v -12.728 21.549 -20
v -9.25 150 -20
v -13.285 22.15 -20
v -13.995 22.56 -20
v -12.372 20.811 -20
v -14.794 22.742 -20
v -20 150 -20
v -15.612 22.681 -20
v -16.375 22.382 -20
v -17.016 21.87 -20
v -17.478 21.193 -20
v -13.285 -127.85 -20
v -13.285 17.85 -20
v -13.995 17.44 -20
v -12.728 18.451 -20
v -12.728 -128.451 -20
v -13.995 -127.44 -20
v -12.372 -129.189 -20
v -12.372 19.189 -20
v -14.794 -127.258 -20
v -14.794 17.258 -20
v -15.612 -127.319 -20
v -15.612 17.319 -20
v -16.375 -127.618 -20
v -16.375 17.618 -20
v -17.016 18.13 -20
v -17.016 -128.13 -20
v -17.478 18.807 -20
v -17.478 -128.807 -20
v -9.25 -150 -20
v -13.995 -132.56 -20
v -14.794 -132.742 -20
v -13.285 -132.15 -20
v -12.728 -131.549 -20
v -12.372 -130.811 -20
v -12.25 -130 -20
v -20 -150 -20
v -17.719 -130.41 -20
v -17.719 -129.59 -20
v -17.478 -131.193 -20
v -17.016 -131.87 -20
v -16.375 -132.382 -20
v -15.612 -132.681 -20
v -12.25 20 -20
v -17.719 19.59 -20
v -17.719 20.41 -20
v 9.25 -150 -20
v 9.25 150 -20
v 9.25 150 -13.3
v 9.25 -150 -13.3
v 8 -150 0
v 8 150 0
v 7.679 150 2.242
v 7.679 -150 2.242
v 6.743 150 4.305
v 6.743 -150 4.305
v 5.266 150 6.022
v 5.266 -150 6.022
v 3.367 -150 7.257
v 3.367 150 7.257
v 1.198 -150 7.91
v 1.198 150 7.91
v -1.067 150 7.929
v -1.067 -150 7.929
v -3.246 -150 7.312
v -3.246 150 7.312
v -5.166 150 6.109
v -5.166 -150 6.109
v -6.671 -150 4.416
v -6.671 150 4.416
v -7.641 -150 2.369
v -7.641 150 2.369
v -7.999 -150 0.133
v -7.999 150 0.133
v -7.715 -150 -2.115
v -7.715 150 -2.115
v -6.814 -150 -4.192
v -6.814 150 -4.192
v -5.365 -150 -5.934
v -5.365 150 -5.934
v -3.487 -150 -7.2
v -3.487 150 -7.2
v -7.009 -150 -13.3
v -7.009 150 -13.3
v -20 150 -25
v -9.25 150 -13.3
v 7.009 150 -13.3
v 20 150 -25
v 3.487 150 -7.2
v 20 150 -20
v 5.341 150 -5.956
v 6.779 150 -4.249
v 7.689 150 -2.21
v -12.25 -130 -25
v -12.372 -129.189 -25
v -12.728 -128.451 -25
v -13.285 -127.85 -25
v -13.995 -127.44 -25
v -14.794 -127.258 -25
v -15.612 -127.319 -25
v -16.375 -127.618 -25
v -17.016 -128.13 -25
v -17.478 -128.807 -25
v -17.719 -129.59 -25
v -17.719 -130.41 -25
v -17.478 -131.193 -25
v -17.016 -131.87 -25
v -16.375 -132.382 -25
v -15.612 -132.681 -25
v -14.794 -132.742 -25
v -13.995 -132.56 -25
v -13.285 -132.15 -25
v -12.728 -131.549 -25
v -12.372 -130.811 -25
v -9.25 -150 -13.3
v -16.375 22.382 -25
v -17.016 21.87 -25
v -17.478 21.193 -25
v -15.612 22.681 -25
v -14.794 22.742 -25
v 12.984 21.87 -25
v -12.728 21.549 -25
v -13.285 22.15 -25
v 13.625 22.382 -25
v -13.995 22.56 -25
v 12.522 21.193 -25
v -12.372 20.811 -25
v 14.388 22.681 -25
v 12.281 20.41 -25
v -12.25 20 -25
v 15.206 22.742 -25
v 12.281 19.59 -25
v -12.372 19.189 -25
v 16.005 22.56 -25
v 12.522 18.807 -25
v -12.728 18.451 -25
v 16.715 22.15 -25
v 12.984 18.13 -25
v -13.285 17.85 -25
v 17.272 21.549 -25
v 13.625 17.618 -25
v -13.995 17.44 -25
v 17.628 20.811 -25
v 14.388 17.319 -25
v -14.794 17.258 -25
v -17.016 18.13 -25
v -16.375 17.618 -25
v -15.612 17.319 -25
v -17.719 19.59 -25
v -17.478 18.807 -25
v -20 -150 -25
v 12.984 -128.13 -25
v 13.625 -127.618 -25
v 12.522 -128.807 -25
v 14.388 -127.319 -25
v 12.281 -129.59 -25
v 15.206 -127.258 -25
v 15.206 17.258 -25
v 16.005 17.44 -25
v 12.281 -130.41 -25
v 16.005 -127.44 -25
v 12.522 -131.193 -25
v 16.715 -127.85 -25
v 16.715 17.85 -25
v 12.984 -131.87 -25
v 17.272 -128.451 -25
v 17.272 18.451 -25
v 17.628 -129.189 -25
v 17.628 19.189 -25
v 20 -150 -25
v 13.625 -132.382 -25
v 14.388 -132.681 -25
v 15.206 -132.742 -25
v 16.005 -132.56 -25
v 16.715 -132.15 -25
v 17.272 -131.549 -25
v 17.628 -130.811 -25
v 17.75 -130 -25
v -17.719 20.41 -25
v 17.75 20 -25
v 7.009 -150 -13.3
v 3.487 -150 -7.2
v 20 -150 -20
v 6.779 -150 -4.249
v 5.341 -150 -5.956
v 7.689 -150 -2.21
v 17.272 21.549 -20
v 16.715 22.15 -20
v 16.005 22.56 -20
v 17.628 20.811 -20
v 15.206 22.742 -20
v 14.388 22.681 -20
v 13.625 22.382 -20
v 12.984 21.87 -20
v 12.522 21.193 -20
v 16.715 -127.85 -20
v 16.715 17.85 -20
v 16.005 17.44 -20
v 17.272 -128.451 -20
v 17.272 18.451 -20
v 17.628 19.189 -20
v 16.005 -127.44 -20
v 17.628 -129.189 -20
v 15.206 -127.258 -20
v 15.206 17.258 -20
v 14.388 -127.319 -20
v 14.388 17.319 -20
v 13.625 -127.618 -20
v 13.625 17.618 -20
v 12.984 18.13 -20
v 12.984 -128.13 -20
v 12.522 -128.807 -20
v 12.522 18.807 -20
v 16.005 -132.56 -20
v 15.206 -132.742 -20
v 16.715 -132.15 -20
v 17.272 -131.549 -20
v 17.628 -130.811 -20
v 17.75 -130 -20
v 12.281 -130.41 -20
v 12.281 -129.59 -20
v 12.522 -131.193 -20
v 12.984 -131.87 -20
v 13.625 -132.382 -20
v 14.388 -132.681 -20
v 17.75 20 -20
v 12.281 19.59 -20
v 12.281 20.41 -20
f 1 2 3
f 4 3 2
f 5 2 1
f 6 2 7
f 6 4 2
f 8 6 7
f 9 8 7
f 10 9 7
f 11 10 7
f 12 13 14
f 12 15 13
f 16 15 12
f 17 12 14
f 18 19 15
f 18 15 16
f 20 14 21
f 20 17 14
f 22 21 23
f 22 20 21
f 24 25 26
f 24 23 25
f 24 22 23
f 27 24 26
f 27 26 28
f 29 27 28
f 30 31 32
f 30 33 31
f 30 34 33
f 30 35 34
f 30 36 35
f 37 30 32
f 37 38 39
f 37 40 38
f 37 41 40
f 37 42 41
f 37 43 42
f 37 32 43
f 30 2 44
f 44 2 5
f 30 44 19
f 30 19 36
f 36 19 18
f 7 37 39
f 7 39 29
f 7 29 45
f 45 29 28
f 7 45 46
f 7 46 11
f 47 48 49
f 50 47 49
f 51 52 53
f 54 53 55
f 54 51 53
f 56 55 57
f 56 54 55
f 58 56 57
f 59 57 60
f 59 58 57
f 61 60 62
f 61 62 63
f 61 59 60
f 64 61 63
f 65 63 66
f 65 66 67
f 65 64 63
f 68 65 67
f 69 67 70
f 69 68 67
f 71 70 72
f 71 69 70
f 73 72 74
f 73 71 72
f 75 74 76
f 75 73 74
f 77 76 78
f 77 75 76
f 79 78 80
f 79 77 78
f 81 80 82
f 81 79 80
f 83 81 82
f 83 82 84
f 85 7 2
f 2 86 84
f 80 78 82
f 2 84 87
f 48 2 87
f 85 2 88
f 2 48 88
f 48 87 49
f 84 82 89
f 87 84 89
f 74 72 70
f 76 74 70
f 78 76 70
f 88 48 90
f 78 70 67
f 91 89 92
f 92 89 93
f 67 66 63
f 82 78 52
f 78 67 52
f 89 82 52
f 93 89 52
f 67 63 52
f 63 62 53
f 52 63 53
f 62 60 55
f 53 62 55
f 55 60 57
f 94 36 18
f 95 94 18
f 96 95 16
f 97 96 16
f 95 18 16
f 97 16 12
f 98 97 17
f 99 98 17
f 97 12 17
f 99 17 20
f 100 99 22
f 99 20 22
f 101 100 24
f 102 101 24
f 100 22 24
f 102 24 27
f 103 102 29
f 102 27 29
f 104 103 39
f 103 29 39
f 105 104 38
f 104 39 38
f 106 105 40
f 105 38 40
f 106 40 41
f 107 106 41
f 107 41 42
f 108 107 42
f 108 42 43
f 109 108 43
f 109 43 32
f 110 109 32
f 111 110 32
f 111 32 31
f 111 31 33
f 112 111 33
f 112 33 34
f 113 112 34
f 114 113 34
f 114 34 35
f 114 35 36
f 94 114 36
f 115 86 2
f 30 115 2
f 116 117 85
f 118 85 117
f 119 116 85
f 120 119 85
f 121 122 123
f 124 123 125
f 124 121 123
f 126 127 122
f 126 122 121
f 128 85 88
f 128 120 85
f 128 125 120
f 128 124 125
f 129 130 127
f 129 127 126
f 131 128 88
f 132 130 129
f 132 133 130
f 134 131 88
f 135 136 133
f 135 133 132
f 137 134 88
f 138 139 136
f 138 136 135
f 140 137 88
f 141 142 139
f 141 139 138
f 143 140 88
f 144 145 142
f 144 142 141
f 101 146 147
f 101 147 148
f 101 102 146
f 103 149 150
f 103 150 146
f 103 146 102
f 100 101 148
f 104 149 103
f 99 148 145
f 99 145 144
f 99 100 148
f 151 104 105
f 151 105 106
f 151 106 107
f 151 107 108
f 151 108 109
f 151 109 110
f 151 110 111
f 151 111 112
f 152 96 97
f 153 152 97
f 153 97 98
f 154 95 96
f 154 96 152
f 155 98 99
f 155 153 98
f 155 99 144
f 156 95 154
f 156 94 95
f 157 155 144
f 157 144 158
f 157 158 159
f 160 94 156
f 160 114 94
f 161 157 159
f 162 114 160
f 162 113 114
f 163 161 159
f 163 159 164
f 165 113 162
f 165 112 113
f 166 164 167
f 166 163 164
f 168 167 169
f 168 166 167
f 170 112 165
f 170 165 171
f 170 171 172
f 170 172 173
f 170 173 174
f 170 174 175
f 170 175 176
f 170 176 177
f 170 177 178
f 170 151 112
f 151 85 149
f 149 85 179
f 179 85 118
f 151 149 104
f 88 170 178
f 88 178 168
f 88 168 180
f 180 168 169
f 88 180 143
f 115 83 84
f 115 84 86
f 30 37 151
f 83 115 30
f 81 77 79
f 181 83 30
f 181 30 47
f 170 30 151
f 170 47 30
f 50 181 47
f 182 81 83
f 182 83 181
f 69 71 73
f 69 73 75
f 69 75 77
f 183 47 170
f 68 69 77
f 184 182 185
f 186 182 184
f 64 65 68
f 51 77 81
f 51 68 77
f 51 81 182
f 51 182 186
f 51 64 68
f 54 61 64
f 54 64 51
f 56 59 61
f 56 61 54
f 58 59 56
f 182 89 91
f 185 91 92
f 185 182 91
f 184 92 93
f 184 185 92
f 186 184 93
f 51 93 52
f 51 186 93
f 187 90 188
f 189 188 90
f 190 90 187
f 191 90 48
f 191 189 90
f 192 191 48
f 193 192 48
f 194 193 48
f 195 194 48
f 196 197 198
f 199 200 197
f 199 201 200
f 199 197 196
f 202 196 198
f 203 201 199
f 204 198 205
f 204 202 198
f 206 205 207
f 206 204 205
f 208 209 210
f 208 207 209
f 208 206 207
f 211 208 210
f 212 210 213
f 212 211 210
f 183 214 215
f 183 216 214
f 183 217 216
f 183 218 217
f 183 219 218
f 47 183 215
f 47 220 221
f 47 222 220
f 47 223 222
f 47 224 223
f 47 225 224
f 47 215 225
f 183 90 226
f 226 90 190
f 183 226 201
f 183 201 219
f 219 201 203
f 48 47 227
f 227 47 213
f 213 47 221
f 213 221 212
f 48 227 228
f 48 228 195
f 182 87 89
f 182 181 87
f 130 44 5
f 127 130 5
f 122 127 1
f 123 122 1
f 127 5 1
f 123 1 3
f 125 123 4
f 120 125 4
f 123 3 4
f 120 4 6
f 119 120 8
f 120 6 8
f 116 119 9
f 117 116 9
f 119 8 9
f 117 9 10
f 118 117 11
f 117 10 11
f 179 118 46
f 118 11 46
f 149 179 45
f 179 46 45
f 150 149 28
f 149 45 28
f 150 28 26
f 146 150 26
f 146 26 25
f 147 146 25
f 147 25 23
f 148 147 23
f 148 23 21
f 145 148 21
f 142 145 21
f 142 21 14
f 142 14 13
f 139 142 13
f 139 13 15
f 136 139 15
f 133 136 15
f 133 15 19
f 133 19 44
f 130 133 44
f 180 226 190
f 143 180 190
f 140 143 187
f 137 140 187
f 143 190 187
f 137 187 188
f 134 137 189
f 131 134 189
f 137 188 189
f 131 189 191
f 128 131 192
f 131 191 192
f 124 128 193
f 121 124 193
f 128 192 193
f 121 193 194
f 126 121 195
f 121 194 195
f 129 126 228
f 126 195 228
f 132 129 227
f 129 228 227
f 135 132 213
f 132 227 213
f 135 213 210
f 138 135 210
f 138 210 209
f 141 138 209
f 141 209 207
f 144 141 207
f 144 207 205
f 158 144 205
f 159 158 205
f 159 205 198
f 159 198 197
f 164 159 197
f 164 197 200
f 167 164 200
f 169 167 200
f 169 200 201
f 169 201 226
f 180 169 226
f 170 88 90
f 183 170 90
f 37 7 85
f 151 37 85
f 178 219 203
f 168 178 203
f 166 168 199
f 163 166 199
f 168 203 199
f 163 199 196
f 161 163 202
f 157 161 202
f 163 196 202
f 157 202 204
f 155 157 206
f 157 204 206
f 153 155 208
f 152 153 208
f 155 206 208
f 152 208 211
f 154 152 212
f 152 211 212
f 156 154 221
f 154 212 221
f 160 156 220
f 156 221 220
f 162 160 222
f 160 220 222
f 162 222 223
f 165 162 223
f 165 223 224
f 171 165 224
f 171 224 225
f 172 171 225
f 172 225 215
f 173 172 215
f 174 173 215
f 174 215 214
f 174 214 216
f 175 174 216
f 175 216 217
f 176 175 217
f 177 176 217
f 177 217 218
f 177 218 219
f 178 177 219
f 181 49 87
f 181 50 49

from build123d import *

# Parameters (mm, degrees)
F1_DEPTH = 150
F2_R     = 2.75
F3_DEPTH = 5.001


with BuildPart() as f1:
    # F0 (on Front) → F1 (new body, symmetric)
    with BuildSketch(Plane.XZ):
        with BuildLine():
            ThreePointArc((3.487119, -7.2), (6.778531, -4.248708), (8, 0))
            ThreePointArc((8, 0), (-4.248708, 6.778531), (-3.487119, -7.2))
            ThreePointArc((-3.487119, -7.2), (0, -8), (3.487119, -7.2))
        make_face()
        with BuildLine():
            ThreePointArc((3.487119, -7.2), (0, -8), (-3.487119, -7.2))
            Line((-3.487119, -7.2), (-7.008956, -13.3))
            Line((-7.008956, -13.3), (-9.25, -13.3))
            Line((-9.25, -13.3), (-9.25, -20))
            Line((-9.25, -20), (-20, -20))
            Line((-20, -20), (-20, -25))
            Line((-20, -25), (20, -25))
            Line((20, -25), (20, -20))
            Line((20, -20), (9.25, -20))
            Line((9.25, -20), (9.25, -13.3))
            Line((9.25, -13.3), (7.008956, -13.3))
            Line((7.008956, -13.3), (3.487119, -7.2))
        make_face()
    extrude(amount=F1_DEPTH, both=True)

    # F2 (on face) → F3 (cut, through all)
    with BuildSketch(Plane.XY.offset(-20)):
        with Locations((-15, -130)):
            Circle(F2_R)
        with Locations((15, -130)):
            Circle(F2_R)
        with Locations((-15, 20)):
            Circle(F2_R)
        with Locations((15, 20)):
            Circle(F2_R)
        with Locations((-15, 170)):
            Circle(F2_R)
        with Locations((15, 170)):
            Circle(F2_R)
        with Locations((-15, 320)):
            Circle(F2_R)
        with Locations((15, 320)):
            Circle(F2_R)
        with Locations((-15, 470)):
            Circle(F2_R)
        with Locations((15, 470)):
            Circle(F2_R)
        with Locations((-15, 620)):
            Circle(F2_R)
        with Locations((15, 620)):
            Circle(F2_R)
        with Locations((-15, 770)):
            Circle(F2_R)
        with Locations((15, 770)):
            Circle(F2_R)
        with Locations((-15, 920)):
            Circle(F2_R)
        with Locations((15, 920)):
            Circle(F2_R)
        with Locations((-15, 1070)):
            Circle(F2_R)
        with Locations((15, 1070)):
            Circle(F2_R)
    extrude(amount=-F3_DEPTH, mode=Mode.SUBTRACT)


solid = f1.part
